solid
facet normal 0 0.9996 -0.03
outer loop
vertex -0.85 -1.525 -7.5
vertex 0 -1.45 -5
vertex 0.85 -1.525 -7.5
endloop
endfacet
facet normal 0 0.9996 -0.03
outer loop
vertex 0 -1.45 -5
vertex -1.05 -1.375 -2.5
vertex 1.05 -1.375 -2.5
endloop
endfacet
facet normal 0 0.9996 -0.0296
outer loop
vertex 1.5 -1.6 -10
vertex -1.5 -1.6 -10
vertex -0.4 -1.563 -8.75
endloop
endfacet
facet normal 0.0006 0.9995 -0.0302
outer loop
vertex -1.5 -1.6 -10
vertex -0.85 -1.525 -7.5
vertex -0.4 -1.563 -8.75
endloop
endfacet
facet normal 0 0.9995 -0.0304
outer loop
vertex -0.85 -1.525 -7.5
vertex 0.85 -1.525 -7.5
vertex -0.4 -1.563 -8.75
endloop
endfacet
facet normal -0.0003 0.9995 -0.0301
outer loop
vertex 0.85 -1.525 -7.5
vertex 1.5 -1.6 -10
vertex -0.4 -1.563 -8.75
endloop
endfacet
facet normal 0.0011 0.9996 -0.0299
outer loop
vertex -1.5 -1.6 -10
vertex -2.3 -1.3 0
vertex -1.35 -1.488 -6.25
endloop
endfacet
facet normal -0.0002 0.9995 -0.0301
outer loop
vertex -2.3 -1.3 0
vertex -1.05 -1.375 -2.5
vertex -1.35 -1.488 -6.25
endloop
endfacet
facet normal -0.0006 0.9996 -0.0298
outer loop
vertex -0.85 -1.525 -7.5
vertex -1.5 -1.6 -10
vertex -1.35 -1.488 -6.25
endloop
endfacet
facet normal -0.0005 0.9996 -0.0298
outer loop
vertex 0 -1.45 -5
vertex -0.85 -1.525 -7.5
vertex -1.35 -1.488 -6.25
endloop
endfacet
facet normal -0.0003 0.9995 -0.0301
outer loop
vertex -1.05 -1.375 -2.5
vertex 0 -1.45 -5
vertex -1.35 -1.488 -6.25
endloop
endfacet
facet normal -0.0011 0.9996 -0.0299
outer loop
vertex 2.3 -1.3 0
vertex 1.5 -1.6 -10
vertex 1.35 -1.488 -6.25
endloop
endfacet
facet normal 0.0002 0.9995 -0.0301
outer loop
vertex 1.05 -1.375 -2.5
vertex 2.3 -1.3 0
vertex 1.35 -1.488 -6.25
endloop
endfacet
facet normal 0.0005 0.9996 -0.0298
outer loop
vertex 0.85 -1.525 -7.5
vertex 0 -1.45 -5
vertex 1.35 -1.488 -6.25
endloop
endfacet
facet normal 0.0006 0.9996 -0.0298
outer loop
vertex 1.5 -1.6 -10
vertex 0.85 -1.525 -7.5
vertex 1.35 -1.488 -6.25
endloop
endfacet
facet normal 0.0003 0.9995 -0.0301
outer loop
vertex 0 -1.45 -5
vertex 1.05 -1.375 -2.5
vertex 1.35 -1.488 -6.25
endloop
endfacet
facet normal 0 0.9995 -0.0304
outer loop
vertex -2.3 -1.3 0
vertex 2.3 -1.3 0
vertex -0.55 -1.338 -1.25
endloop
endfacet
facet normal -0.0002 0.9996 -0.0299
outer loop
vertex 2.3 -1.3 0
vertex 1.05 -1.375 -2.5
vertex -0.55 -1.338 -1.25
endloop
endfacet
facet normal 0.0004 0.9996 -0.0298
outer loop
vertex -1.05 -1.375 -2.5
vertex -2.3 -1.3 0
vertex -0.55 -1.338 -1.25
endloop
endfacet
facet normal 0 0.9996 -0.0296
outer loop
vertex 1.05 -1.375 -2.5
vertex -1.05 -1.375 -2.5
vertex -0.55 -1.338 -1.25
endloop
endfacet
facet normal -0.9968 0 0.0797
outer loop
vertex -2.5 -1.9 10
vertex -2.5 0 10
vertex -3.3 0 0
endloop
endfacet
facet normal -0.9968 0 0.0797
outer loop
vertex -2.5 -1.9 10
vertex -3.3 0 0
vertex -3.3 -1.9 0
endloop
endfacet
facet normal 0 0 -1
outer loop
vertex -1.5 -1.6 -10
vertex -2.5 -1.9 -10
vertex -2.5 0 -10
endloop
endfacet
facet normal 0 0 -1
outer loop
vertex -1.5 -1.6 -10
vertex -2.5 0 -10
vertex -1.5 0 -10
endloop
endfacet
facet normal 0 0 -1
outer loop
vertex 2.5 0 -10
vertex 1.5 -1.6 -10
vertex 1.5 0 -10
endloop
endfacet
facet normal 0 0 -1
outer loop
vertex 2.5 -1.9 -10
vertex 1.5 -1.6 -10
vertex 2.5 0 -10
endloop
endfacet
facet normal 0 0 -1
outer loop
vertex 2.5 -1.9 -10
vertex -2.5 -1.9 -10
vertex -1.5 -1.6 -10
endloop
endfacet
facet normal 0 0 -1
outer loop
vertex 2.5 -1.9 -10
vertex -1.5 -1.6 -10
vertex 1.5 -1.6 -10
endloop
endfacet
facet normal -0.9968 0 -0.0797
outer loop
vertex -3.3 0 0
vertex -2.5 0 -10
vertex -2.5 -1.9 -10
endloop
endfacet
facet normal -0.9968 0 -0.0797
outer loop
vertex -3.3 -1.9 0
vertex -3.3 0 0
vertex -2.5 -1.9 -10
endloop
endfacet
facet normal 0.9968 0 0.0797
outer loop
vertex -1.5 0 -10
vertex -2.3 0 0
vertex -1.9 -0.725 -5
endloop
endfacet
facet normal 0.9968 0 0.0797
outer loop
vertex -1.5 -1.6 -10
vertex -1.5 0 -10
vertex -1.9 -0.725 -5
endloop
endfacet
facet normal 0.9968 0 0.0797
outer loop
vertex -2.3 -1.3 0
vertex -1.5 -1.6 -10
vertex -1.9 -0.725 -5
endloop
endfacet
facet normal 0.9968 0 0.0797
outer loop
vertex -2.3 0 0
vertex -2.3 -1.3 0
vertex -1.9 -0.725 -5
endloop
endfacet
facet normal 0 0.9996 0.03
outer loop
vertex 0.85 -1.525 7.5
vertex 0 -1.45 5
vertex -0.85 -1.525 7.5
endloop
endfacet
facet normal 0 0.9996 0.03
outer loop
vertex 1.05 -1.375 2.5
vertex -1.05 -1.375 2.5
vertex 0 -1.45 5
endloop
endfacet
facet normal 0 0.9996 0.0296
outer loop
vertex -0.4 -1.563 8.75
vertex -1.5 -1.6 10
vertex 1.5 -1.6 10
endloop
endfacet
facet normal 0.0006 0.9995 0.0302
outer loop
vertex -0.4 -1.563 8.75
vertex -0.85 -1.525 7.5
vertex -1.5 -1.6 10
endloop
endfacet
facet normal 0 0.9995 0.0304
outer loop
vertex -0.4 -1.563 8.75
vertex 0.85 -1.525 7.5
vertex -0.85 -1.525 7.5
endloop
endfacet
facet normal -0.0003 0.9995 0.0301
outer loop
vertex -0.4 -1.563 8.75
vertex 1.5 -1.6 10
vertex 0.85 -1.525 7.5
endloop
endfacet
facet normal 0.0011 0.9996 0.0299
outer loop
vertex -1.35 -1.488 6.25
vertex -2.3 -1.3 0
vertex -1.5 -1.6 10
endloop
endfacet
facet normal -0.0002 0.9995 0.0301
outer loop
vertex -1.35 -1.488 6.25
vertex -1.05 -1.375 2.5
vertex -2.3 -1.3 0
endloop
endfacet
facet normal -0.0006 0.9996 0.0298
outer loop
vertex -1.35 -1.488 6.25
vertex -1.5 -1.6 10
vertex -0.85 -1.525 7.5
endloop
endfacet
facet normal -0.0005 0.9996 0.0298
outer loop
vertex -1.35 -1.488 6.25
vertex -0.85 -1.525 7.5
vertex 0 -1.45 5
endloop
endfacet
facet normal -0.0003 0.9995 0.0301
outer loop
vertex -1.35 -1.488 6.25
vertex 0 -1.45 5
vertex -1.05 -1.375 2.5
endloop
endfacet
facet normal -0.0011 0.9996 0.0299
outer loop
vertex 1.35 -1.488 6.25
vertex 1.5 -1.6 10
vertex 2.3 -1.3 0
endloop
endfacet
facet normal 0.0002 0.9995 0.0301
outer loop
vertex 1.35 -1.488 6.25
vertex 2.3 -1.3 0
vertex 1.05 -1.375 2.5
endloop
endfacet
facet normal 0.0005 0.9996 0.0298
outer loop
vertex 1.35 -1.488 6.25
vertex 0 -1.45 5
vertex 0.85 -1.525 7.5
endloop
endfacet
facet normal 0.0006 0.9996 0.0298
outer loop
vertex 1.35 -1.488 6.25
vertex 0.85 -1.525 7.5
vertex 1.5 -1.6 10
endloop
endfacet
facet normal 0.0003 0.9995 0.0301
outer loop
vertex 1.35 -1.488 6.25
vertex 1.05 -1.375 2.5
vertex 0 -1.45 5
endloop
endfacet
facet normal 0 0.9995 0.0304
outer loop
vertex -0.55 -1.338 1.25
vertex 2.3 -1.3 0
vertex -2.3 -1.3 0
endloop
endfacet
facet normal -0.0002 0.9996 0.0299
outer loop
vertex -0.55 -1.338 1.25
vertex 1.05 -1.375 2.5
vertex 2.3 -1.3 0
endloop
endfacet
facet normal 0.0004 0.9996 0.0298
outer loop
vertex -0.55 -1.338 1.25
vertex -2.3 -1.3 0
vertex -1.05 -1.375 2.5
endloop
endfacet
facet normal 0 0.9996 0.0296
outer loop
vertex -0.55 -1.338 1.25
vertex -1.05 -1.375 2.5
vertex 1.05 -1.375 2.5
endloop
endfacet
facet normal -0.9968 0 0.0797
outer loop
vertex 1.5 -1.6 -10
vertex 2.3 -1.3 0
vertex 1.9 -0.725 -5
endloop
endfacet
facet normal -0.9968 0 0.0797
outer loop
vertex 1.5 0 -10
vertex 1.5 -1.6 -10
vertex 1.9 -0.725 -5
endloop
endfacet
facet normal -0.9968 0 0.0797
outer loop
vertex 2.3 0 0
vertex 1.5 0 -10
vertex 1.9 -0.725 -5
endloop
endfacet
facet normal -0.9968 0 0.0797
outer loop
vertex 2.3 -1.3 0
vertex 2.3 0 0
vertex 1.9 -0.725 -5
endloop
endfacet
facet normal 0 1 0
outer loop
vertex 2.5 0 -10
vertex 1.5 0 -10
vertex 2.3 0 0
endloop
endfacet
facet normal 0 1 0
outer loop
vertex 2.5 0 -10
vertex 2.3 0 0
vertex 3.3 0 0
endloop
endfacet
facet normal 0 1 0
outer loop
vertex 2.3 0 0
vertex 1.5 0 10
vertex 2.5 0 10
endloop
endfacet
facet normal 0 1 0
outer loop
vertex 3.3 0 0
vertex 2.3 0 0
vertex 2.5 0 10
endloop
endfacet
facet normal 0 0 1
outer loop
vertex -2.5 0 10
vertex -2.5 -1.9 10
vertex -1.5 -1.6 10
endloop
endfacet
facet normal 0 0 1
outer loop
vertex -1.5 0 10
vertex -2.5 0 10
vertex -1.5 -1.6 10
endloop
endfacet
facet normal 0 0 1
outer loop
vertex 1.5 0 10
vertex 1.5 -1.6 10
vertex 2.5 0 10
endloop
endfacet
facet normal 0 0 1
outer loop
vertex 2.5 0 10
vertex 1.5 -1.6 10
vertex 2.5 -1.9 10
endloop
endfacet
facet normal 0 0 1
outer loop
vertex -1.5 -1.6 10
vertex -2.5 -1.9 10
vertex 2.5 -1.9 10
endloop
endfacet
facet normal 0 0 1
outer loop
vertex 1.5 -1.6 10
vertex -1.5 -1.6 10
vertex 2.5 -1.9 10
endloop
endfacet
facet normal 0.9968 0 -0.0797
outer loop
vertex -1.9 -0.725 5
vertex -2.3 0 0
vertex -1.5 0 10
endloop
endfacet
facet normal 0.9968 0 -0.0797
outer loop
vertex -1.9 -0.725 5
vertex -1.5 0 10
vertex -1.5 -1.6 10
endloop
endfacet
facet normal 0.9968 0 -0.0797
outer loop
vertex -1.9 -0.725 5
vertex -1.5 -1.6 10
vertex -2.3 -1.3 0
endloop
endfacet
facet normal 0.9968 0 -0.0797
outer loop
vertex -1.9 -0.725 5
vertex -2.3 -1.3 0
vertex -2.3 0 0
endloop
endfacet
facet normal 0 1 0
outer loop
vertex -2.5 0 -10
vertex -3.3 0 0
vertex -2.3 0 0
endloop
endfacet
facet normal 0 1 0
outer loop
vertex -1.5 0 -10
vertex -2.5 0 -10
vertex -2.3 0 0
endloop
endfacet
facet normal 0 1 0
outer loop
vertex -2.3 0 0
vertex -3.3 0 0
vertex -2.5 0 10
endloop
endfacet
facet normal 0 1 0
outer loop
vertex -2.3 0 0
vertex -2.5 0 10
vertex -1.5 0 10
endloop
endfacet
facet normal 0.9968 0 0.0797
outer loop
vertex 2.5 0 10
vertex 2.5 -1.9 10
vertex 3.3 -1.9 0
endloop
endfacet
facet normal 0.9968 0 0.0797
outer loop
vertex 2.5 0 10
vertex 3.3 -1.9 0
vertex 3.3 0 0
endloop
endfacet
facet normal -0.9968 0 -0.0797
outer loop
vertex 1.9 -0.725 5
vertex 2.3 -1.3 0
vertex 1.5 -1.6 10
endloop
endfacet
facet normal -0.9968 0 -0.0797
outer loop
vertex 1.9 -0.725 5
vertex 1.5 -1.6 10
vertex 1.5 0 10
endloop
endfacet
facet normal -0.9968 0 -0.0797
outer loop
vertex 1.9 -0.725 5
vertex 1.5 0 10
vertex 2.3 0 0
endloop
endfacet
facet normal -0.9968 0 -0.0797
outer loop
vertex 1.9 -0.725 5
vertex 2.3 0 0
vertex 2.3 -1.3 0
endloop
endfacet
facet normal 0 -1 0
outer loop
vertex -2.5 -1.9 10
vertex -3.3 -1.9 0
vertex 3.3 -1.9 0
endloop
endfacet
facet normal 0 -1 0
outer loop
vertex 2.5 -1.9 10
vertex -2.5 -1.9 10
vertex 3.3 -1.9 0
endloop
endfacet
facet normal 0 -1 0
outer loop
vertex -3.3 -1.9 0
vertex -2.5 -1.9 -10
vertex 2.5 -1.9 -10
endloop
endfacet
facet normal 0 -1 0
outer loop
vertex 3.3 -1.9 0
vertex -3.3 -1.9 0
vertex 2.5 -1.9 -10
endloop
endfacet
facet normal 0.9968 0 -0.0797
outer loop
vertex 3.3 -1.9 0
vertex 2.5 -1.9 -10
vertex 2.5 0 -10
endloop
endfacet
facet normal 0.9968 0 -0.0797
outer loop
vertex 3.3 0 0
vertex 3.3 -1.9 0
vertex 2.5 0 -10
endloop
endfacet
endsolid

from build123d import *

# Parameters (mm, degrees)
ESBO_O3_W        = 10.701271156
ESBO_O3_H        = 3.779396545
CORTE_MEIO_DEPTH = 80


with BuildPart() as part:
    # Esboço1 → Loft1 section 0
    with BuildSketch(Plane.XY):
        with BuildLine():
            Line((-3.3, -1.9), (3.3, -1.9))
            Line((3.3, -1.9), (3.3, 1.9))
            Line((3.3, 1.9), (-3.3, 1.9))
            Line((-3.3, 1.9), (-3.3, -1.9))
        make_face()
    # Esboço2 → Loft1 section 1
    with BuildSketch(Plane.XY.offset(10)):
        with BuildLine():
            Line((-2.5, -1.9), (2.5, -1.9))
            Line((2.5, -1.9), (2.5, 1.9))
            Line((2.5, 1.9), (-2.5, 1.9))
            Line((-2.5, 1.9), (-2.5, -1.9))
        make_face()
    loft1 = loft()

    # Esboço3 → Corte Meio (cut)
    with BuildSketch(Plane.XY):
        with Locations((0.988815263, 1.889698273)):
            Rectangle(ESBO_O3_W, ESBO_O3_H)
    corte_meio = extrude(amount=CORTE_MEIO_DEPTH, mode=Mode.SUBTRACT)

    # Esboço6 → Loft de corte1 section 0
    with BuildSketch(Plane.XY.offset(10)):
        with BuildLine():
            Line((-1.5, -1.6), (1.5, -1.6))
            Line((1.5, -1.6), (1.5, 1.6))
            Line((1.5, 1.6), (-1.5, 1.6))
            Line((-1.5, 1.6), (-1.5, -1.6))
        make_face()
    # Esboço5 → Loft de corte1 section 1
    with BuildSketch(Plane.XY):
        with BuildLine():
            Line((2.3, -1.3), (-2.3, -1.3))
            Line((-2.3, -1.3), (-2.3, 1.3))
            Line((-2.3, 1.3), (2.3, 1.3))
            Line((2.3, 1.3), (2.3, -1.3))
        make_face()
    loft_de_corte1 = loft(mode=Mode.SUBTRACT)

    # Espelhar1: Loft1 across plane
    add(loft1.mirror(Plane.XY))

    # Espelhar2: Corte Meio across plane
    add(corte_meio.mirror(Plane.XY), mode=Mode.SUBTRACT)

    # Espelhar3: Loft de corte1 across plane
    add(loft_de_corte1.mirror(Plane.XY), mode=Mode.SUBTRACT)


solid = part.part
